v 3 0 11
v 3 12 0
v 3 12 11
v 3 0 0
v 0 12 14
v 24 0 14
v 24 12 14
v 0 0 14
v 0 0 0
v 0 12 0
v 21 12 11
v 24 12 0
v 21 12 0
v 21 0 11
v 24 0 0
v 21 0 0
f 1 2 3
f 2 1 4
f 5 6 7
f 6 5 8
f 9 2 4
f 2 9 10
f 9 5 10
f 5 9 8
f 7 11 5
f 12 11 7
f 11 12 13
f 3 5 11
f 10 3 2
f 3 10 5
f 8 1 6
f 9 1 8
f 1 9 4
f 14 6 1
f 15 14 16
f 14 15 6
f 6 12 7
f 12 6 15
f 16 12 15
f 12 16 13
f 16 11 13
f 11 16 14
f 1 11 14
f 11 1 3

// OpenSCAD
// CI specimen with an accessible underside for support-interface trials.
span_mm = 24;
width_mm = 12;
height_mm = 14;
wall_mm = 3;
union() {
    cube([wall_mm, width_mm, height_mm]);
    translate([span_mm-wall_mm, 0, 0]) cube([wall_mm, width_mm, height_mm]);
    translate([0, 0, height_mm-wall_mm]) cube([span_mm, width_mm, wall_mm]);
}
